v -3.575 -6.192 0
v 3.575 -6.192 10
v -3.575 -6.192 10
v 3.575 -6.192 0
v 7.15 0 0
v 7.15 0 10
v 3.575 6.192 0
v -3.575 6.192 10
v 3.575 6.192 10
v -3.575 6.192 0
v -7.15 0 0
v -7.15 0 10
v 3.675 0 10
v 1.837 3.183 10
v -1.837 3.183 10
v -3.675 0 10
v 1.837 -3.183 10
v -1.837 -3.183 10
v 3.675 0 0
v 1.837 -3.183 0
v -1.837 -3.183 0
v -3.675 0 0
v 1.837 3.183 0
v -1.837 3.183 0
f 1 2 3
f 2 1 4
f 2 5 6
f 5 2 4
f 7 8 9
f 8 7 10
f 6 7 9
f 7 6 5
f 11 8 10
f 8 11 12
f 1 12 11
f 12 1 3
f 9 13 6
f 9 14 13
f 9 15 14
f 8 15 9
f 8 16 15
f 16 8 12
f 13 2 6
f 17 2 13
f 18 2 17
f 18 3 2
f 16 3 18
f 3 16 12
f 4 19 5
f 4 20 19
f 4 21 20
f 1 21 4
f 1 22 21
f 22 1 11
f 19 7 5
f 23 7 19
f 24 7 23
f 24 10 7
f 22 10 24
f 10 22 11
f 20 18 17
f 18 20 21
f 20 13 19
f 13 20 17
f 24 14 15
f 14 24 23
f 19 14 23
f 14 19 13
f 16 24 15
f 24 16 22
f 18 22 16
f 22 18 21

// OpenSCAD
module driverHandle(tolerance=0.2) {
  hexHeight = 7.15;

  difference(){    
    cylinder(r=hexHeight, h=10, $fn=6);
    
    translate([0,0,-1])
    cylinder(r=(hexHeight + tolerance)/2, h=20, $fn=6);
  }
}

driverHandle();
